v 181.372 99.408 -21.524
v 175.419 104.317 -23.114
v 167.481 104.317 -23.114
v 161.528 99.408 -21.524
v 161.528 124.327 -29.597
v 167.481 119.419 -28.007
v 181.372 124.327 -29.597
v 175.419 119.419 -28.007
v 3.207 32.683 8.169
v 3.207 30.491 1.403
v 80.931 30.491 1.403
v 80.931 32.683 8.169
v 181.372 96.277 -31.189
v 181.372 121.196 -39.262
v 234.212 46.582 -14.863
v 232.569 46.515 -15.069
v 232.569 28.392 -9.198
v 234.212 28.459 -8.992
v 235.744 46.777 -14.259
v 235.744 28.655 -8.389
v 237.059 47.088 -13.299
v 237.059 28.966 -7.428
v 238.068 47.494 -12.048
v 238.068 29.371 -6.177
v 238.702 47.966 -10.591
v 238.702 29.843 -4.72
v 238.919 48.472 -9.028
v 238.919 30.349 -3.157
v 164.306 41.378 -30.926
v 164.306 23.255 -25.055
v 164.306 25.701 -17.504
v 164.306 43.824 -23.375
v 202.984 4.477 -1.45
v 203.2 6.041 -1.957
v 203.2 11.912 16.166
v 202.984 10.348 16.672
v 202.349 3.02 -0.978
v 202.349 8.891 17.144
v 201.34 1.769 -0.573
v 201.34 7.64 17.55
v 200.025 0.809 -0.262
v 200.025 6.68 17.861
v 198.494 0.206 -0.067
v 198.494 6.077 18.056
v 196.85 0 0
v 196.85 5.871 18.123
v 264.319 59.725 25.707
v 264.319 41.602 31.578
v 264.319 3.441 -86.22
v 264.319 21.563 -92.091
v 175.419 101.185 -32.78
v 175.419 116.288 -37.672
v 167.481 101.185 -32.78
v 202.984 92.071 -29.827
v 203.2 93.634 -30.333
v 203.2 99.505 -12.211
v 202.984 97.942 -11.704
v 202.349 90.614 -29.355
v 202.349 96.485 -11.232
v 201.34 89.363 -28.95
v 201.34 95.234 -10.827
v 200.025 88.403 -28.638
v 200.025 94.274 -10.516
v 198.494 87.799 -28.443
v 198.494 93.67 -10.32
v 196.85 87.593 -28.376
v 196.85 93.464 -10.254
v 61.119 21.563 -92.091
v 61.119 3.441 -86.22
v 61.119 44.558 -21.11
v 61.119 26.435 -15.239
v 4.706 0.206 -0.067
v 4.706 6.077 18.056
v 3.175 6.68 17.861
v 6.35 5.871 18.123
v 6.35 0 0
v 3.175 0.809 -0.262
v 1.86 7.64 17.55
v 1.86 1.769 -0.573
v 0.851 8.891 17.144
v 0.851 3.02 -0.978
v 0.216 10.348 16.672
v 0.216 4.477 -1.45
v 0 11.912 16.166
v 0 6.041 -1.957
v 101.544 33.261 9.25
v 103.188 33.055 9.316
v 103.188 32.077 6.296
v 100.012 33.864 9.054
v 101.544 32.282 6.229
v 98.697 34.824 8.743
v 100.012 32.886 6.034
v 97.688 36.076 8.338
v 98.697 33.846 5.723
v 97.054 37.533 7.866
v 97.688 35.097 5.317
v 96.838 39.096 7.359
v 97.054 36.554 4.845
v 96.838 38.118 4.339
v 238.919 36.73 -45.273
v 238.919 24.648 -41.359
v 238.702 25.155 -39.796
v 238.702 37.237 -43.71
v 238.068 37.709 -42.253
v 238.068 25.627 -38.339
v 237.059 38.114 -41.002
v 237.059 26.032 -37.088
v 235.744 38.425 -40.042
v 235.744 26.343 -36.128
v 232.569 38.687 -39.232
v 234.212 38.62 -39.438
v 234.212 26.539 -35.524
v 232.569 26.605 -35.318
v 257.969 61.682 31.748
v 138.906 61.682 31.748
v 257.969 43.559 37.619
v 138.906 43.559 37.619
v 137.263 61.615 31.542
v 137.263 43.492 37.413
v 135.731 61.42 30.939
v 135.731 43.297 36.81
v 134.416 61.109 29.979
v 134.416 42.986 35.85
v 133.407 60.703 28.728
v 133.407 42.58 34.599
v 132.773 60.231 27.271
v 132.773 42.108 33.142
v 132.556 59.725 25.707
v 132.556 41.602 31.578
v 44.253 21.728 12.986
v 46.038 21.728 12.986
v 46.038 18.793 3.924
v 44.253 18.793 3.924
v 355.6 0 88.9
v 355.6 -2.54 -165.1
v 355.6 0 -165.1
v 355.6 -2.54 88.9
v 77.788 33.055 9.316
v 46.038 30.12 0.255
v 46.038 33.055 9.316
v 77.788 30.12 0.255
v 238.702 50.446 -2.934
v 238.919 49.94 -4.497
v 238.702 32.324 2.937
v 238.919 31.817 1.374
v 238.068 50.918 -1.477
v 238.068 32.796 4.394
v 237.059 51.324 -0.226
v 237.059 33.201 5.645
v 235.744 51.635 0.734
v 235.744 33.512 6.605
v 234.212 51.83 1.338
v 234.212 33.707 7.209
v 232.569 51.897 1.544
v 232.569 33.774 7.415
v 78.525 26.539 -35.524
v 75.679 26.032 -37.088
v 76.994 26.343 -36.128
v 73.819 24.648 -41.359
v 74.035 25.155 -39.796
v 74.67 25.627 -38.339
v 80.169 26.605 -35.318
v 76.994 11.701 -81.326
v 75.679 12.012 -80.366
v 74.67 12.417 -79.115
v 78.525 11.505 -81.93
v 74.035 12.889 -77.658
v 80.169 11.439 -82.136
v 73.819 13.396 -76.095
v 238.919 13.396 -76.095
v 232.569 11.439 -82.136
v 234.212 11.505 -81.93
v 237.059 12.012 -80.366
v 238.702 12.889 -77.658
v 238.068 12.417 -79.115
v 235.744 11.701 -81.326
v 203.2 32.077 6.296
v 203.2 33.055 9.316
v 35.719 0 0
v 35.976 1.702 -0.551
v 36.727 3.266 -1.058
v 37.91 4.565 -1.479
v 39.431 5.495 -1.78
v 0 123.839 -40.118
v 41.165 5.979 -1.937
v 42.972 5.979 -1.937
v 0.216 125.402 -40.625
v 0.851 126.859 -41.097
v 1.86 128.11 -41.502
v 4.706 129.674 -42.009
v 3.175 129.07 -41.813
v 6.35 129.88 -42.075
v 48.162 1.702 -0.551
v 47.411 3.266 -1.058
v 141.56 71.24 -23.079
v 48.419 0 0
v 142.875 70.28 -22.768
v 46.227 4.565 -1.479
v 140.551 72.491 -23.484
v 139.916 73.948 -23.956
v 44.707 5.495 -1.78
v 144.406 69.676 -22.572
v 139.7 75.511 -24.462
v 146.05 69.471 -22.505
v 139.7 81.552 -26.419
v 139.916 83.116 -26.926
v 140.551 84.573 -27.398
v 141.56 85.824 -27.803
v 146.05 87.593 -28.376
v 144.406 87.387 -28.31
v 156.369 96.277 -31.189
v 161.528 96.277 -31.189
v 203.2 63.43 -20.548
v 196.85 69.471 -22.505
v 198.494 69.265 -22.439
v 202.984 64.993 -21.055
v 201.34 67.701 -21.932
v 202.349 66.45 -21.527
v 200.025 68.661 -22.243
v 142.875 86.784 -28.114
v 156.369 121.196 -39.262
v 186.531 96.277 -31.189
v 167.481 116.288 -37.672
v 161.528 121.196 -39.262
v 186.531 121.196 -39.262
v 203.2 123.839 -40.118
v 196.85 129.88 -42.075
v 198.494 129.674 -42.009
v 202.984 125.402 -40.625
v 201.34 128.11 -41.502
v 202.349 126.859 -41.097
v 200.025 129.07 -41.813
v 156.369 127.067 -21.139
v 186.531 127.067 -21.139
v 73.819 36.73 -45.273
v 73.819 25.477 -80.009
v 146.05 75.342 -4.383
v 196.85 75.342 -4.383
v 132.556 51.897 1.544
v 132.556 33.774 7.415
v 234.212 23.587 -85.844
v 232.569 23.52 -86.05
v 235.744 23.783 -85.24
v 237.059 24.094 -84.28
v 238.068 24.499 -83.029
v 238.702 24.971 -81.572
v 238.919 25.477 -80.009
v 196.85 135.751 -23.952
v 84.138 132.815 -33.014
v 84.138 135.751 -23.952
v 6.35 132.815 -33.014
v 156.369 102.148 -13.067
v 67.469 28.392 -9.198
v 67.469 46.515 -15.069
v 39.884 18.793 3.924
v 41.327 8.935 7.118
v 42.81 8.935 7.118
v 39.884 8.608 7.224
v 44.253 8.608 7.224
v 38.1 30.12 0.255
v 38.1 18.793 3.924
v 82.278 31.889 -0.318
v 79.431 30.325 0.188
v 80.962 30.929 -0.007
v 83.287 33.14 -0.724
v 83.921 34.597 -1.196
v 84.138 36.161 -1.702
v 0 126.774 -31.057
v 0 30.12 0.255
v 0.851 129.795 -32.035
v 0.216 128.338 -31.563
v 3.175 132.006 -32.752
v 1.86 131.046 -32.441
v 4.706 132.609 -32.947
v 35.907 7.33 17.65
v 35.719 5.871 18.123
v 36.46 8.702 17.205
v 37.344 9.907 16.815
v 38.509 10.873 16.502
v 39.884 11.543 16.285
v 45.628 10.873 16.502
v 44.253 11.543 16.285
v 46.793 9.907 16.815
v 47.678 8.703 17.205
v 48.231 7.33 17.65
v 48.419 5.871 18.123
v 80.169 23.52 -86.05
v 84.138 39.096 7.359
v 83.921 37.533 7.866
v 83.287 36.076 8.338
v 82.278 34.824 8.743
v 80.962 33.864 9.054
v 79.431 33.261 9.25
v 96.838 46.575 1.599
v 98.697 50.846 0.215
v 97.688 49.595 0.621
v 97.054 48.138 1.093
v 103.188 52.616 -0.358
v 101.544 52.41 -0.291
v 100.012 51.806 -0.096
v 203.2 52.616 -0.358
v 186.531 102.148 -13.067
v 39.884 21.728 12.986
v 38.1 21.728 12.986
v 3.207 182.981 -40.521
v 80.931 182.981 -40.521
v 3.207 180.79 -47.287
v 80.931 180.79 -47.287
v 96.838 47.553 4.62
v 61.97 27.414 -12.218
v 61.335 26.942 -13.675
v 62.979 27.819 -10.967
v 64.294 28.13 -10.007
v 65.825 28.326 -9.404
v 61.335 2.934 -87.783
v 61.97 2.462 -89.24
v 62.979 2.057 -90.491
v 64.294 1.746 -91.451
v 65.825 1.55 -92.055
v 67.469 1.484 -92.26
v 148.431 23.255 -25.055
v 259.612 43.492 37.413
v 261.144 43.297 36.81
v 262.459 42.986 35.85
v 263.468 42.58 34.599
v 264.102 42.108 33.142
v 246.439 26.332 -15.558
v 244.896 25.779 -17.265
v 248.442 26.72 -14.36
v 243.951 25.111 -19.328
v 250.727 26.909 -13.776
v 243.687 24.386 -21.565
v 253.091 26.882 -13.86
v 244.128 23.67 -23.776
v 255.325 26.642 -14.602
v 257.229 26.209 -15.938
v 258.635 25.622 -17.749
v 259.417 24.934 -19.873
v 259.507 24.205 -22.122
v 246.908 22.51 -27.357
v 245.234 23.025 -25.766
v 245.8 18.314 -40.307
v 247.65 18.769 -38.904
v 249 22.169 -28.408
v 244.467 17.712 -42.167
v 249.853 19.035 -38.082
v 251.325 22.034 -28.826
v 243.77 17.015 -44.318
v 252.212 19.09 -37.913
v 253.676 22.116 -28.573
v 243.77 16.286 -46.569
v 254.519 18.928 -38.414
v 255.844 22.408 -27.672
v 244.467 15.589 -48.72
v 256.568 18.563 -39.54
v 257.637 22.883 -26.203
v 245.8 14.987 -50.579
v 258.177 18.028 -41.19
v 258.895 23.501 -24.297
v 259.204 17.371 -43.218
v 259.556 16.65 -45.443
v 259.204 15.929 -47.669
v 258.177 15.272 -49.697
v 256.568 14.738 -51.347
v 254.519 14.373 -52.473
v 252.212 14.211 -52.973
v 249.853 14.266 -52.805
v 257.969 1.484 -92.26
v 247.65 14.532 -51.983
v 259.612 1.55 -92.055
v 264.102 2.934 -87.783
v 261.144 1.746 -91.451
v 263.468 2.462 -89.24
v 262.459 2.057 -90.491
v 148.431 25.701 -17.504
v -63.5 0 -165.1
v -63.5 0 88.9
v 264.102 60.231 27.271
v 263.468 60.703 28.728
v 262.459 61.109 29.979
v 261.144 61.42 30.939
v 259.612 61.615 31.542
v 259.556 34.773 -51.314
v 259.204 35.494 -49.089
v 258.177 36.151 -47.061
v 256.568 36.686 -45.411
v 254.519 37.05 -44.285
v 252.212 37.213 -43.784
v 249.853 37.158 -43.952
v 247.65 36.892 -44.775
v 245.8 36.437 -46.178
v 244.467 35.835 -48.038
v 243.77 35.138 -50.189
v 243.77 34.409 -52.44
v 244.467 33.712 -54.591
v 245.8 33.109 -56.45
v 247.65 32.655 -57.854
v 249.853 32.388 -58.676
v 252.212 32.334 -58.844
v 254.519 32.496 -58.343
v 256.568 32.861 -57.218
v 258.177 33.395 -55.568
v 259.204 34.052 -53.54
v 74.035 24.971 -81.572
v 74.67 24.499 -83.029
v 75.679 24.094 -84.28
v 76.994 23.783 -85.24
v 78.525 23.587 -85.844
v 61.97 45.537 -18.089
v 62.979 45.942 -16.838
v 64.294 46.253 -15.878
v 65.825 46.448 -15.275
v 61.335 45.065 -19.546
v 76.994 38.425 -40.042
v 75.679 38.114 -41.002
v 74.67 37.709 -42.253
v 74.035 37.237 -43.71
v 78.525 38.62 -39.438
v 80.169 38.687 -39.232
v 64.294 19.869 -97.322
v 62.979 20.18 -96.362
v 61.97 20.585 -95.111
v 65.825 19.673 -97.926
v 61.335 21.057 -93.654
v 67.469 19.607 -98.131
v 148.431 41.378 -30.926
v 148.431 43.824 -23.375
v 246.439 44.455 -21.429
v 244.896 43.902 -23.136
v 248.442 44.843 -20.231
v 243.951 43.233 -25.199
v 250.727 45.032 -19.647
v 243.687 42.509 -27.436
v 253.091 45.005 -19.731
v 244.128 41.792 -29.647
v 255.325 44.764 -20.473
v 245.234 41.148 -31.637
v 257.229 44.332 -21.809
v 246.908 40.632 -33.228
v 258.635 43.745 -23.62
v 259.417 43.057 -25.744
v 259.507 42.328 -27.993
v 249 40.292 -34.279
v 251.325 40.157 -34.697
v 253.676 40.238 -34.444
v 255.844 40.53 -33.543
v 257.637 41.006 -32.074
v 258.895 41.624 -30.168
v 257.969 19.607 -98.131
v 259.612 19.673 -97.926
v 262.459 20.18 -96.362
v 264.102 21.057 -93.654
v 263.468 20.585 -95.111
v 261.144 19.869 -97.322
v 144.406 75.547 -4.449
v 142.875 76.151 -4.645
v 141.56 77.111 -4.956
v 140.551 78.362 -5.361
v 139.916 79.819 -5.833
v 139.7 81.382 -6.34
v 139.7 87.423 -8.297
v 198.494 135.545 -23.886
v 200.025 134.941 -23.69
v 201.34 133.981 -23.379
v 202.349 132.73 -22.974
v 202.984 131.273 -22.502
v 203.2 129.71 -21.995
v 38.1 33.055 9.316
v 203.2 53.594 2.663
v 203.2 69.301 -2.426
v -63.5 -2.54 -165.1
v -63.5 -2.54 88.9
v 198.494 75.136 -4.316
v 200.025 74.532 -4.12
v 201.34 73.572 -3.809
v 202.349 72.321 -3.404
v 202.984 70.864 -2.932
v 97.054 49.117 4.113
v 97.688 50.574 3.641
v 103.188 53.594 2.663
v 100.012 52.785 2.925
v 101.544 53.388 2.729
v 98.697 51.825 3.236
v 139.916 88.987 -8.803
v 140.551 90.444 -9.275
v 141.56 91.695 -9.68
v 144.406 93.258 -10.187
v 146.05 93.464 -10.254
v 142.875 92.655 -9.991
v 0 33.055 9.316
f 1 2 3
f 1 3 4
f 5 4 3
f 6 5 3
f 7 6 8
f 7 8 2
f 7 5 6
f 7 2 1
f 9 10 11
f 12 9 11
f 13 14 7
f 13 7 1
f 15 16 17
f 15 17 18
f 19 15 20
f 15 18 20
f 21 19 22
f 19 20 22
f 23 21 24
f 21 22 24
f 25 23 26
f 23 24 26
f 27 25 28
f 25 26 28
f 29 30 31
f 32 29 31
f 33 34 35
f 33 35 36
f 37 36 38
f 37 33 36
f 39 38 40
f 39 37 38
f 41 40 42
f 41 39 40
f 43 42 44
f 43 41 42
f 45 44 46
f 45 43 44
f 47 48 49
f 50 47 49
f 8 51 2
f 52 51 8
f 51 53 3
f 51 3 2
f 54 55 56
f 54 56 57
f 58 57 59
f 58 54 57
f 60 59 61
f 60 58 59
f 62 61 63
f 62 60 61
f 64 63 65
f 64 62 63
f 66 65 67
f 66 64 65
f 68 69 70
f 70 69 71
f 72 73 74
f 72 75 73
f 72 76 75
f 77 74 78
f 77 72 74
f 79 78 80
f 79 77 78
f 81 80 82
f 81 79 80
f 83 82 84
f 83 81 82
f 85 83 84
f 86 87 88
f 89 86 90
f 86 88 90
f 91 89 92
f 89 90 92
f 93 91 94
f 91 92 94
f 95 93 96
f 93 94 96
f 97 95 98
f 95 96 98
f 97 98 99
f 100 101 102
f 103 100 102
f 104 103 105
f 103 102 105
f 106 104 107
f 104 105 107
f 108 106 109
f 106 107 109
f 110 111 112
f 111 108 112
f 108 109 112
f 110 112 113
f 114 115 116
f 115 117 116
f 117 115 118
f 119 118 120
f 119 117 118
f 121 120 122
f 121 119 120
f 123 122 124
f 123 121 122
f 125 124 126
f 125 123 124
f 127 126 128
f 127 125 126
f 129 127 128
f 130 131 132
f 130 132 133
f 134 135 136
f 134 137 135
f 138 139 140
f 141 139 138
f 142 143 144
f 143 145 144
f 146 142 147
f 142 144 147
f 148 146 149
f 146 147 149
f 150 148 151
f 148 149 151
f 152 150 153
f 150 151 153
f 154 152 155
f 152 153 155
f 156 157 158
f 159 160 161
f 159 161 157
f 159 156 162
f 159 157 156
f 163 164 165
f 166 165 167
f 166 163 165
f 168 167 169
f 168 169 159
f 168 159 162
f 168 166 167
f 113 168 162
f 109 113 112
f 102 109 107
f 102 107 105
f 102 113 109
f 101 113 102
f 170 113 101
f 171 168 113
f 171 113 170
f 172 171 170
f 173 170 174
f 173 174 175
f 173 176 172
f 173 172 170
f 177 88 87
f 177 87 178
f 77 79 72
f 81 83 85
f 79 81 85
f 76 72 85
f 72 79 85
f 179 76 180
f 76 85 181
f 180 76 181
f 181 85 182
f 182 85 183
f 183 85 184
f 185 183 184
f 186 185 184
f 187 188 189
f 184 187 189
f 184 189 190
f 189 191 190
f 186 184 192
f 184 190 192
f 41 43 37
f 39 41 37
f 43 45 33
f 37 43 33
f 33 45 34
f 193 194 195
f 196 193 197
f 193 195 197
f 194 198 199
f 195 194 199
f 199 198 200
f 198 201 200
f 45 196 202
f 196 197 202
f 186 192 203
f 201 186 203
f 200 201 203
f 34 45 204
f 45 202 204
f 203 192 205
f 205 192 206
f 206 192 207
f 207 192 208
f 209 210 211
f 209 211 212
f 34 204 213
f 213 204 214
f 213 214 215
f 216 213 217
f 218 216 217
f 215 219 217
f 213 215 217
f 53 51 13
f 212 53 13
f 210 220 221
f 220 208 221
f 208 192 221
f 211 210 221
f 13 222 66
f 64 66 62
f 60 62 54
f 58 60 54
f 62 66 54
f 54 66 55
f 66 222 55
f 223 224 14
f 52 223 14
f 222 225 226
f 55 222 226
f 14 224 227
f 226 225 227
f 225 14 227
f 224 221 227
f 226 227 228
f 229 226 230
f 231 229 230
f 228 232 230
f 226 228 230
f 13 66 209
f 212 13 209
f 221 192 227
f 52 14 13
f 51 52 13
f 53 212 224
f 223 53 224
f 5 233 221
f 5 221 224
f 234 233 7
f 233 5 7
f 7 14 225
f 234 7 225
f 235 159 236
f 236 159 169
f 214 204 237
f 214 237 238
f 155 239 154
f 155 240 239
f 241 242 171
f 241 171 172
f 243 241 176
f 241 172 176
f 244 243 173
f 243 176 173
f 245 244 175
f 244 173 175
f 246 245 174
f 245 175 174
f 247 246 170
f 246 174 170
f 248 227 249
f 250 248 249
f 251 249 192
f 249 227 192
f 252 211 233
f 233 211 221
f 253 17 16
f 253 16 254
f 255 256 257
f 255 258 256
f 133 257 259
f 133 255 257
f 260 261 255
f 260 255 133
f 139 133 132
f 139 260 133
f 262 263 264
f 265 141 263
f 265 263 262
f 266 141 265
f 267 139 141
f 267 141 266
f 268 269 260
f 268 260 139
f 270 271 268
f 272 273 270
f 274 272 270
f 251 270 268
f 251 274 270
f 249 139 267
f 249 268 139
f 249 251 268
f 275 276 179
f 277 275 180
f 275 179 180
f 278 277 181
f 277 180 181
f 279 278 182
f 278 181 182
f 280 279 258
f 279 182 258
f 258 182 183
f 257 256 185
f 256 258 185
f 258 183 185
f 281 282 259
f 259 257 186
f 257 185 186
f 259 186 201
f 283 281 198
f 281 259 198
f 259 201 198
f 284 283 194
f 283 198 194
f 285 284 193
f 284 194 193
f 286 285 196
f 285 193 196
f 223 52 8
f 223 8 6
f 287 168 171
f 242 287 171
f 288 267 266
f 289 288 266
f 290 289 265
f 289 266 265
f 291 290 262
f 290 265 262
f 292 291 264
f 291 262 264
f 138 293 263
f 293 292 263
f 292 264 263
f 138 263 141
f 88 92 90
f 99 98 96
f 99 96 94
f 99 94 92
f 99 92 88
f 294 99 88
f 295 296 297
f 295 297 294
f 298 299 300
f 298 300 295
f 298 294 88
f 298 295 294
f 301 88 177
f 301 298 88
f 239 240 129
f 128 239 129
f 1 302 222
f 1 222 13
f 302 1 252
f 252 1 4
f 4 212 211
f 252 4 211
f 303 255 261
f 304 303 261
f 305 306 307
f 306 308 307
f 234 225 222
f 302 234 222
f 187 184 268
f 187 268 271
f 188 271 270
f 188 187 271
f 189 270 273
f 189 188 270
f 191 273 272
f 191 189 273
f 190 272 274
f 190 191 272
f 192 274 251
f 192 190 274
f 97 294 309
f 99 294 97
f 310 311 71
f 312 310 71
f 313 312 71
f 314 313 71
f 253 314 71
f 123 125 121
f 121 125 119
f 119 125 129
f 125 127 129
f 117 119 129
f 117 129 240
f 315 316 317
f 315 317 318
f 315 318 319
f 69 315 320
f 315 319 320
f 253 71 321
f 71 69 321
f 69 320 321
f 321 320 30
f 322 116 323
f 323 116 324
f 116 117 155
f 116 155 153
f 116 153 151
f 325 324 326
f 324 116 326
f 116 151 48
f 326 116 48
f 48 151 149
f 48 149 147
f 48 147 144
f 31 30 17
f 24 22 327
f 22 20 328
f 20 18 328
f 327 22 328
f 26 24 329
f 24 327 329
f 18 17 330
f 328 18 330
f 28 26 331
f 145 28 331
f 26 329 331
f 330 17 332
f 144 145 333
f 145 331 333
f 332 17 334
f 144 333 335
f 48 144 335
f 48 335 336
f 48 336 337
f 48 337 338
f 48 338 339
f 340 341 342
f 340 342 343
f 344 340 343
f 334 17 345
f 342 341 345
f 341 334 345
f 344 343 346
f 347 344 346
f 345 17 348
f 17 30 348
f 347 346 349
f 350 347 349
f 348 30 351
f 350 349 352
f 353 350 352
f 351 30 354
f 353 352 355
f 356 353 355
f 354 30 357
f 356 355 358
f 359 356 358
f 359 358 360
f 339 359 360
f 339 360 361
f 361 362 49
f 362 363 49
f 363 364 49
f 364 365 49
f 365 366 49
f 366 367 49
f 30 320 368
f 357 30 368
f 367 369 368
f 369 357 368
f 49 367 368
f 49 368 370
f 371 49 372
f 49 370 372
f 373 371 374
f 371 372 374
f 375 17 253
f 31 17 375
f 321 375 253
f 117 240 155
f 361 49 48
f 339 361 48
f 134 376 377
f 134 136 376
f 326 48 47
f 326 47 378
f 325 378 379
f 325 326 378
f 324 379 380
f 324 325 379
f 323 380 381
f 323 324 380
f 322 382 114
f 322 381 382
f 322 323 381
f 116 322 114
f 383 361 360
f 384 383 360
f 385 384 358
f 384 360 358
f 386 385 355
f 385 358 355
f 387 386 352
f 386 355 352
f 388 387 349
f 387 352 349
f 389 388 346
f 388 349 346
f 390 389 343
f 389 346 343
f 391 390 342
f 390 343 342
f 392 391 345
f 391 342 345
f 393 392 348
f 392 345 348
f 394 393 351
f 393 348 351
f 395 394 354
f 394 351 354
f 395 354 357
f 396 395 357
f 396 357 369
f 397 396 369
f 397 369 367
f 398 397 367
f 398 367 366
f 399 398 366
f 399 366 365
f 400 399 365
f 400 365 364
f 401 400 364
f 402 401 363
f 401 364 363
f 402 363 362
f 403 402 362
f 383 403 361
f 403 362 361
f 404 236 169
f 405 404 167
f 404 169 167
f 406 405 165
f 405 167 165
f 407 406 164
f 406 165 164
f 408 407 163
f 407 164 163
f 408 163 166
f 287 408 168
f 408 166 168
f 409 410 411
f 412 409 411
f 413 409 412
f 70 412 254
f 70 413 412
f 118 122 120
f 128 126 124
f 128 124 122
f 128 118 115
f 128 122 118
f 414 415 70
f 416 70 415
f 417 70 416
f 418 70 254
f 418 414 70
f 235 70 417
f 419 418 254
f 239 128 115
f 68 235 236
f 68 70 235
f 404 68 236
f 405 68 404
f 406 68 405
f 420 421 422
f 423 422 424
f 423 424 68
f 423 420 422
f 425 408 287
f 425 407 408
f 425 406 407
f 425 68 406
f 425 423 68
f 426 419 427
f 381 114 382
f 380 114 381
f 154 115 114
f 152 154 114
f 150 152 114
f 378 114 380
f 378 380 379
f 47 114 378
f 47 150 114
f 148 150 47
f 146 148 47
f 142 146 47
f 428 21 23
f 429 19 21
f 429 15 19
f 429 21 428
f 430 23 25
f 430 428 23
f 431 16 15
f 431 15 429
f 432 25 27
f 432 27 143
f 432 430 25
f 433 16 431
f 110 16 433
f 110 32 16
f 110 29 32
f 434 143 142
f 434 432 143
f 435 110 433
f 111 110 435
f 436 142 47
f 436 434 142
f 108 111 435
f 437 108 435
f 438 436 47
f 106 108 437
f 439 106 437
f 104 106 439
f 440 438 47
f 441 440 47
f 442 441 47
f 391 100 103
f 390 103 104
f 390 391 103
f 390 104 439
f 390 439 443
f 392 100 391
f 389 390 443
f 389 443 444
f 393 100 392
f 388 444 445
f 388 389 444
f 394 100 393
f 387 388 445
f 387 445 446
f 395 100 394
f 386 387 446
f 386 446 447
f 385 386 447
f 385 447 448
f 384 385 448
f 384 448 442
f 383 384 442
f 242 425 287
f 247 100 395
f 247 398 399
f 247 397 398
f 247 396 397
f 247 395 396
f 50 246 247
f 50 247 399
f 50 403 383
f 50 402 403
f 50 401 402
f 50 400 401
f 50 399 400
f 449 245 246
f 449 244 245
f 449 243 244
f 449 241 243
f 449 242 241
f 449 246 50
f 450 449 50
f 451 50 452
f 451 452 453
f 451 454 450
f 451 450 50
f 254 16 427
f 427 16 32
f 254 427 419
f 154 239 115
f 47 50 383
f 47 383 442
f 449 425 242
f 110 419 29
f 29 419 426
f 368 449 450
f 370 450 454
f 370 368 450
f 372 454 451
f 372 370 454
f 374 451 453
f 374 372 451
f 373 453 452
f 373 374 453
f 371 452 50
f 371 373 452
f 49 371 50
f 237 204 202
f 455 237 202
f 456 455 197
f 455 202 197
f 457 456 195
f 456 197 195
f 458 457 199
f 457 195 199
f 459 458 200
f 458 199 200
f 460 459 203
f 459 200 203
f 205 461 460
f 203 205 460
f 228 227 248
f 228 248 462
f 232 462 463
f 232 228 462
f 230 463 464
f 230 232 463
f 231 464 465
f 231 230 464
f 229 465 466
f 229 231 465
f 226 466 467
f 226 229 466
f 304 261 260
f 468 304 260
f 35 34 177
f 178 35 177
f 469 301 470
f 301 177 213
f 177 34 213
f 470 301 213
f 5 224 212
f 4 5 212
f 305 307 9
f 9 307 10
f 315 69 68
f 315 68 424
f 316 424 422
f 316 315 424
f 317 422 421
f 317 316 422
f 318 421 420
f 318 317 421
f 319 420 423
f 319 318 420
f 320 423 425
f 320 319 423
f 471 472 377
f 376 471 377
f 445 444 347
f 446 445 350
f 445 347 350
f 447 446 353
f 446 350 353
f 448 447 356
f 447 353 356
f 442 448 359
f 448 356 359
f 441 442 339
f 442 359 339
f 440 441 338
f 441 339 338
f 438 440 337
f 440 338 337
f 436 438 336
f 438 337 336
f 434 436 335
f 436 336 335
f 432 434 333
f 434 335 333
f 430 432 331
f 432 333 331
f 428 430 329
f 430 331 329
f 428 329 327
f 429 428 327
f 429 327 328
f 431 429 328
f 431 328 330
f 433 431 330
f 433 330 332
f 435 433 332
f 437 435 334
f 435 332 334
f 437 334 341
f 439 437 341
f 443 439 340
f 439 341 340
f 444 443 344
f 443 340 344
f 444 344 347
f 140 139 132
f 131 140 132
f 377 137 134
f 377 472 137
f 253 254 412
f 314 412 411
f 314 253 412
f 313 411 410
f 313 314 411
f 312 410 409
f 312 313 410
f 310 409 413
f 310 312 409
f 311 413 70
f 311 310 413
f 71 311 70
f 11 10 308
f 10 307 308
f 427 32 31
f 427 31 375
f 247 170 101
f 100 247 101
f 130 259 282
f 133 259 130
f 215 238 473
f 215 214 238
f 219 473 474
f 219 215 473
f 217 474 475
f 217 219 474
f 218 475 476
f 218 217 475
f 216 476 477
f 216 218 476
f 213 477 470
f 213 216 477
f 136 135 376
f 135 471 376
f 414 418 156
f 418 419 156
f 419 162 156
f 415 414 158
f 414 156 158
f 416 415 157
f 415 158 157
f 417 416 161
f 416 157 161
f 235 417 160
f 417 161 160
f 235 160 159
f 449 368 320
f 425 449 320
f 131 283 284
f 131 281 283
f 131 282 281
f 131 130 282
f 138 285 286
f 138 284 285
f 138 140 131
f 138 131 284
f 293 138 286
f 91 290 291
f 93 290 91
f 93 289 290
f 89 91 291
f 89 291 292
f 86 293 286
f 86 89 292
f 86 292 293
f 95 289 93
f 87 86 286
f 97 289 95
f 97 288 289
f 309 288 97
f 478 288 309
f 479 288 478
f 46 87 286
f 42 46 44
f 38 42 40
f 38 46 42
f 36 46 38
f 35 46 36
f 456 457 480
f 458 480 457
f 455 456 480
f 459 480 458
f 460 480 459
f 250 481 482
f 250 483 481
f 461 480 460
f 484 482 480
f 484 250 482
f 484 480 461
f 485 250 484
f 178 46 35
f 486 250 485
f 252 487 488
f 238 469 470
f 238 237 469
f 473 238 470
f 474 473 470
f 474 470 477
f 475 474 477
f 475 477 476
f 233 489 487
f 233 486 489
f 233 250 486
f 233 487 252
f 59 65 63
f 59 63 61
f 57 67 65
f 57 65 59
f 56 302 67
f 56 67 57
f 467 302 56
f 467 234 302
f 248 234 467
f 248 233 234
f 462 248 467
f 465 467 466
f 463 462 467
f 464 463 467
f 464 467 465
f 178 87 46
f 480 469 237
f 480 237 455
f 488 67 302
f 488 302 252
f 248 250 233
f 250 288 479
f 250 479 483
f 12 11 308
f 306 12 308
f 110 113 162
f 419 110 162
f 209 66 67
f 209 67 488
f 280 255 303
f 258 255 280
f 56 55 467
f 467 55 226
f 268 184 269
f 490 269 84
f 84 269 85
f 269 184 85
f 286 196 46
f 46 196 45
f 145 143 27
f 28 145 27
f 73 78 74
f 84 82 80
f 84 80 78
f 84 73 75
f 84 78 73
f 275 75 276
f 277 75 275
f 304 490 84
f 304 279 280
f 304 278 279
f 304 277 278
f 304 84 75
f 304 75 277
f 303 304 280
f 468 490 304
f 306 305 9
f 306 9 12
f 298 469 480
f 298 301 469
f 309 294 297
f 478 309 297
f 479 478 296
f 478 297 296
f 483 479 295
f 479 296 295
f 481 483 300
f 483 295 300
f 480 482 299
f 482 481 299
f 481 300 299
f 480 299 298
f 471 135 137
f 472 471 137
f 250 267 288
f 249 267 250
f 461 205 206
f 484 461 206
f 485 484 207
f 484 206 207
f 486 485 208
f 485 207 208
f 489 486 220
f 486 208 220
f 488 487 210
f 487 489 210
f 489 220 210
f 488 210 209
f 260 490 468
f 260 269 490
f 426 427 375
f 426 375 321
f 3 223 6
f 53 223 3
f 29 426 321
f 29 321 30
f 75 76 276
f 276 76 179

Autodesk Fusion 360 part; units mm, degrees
sketch "Face Plate Sketch" plane through (0, 0, 0) normal (0, 0, 1) x (1, 0, 0)
  line L0 (6.35, 0) -> (196.85, 0)
  line L1 (196.85, 136.525) -> (6.35, 136.525)
  line L2 (0, 130.175) -> (0, 6.35)
  line L3 (0, 28.575) -> (77.7875, 28.575)
  line L4 (84.1375, 34.925) -> (84.1375, 136.525)
  line L5 (196.85, 92.075) -> (146.05, 92.075)
  line L6 (139.7, 92.075) -> (139.7, 136.525)
  line L7 (139.7, 85.725) -> (139.7, 79.375)
  line L8 (146.05, 73.025) -> (196.85, 73.025)
  line L9 (203.2, 50.165) -> (103.1875, 50.165)
  line L10 (96.8375, 43.815) -> (96.8375, 34.925)
  line L11 (103.1875, 28.575) -> (203.2, 28.575)
  line L12 (203.2, 6.35) -> (203.2, 66.675)
  line L13 (203.2, 98.425) -> (203.2, 130.175)
  arc A0 (146.05, 92.075) -> (139.7, 85.725) centre (146.05, 85.725) ccw
  arc A1 (196.85, 92.075) -> (203.2, 98.425) centre (196.85, 98.425) ccw
  arc A2 (203.2, 130.175) -> (196.85, 136.525) centre (196.85, 130.175) ccw
  arc A3 (139.7, 79.375) -> (146.05, 73.025) centre (146.05, 79.375) ccw
  arc A4 (203.2, 66.675) -> (196.85, 73.025) centre (196.85, 66.675) ccw
  arc A5 (103.1875, 50.165) -> (96.8375, 43.815) centre (103.1875, 43.815) ccw
  arc A6 (96.8375, 34.925) -> (103.1875, 28.575) centre (103.1875, 34.925) ccw
  arc A7 (196.85, 0) -> (203.2, 6.35) centre (196.85, 6.35) ccw
  arc A8 (0, 6.35) -> (6.35, 0) centre (6.35, 6.35) ccw
  arc A9 (6.35, 136.525) -> (0, 130.175) centre (6.35, 130.175) ccw
  arc A10 (77.7875, 28.575) -> (84.1375, 34.925) centre (77.7875, 34.925) ccw
  line L14 (139.7, 114.3) -> (171.45, 114.3) construction
  line L15 (171.45, 92.075) -> (171.45, 127) construction
  line L16 (171.45, 114.3) -> (203.2, 114.3) construction
  line L17 (175.4188, 122.2375) -> (167.4813, 122.2375)
  line L18 (167.4813, 122.2375) -> (167.4813, 106.3625)
  line L19 (167.4813, 106.3625) -> (175.4188, 106.3625)
  line L20 (175.4188, 106.3625) -> (175.4188, 122.2375)
  line L21 (175.4188, 122.2375) -> (167.4813, 106.3625) construction
  line L22 (167.4813, 122.2375) -> (175.4188, 106.3625) construction
  line L23 (181.3719, 103.1875) -> (161.5281, 103.1875)
  line L24 (161.5281, 103.1875) -> (161.5281, 125.4125)
  line L25 (161.5281, 125.4125) -> (181.3719, 125.4125)
  line L26 (181.3719, 125.4125) -> (181.3719, 103.1875)
  line L27 (181.3719, 103.1875) -> (161.5281, 125.4125) construction
  line L28 (161.5281, 103.1875) -> (181.3719, 125.4125) construction
  line L29 (186.5313, 101.2031) -> (156.3688, 101.2031)
  line L30 (156.3688, 101.2031) -> (156.3688, 127.3969)
  line L31 (156.3688, 127.3969) -> (186.5313, 127.3969)
  line L32 (186.5313, 127.3969) -> (186.5313, 101.2031)
  line L33 (186.5313, 101.2031) -> (156.3688, 127.3969) construction
  line L34 (156.3688, 101.2031) -> (186.5313, 127.3969) construction
  line L35 (161.5281, 125.4125) -> (161.5281, 127.3969)
  line L36 (181.3719, 125.4125) -> (181.3719, 127.3969)
  line L37 (181.3719, 103.1875) -> (181.3719, 101.2031)
  line L38 (161.5281, 103.1875) -> (161.5281, 101.2031)
  line L39 (42.0687, 31.8116) -> (42.0687, 28.575) construction
  line L40 (38.1, 28.575) -> (46.0375, 28.575)
  line L41 (46.0375, 28.575) -> (46.0375, 16.6687)
  line L42 (46.0375, 16.6687) -> (38.1, 16.6687)
  line L43 (38.1, 16.6687) -> (38.1, 28.575)
  line L44 (44.2531, 16.6687) -> (39.8843, 16.6687)
  line L45 (39.8843, 16.6687) -> (39.8843, 5.5562)
  line L46 (39.8843, 5.5562) -> (44.2531, 5.5562)
  line L47 (44.2531, 5.5562) -> (44.2531, 16.6687)
  line L48 (40.4812, 5.5562) -> (43.6562, 5.5562)
  line L49 (43.6562, 5.5562) -> (43.6563, 0)
  line L50 (43.6563, 0) -> (40.4813, 0)
  line L51 (40.4813, 0) -> (40.4812, 5.5562)
  line L52 (40.4813, 0) -> (43.6563, 0)
  circle A11 centre (42.0688, 0) radius 6.35
  point P0 (203.2, 0)
  point P1 (84.1375, 28.575)
  point P2 (139.7, 73.025)
  point P3 (96.8375, 50.165)
  point P4 (96.8375, 28.575)
  point P5 (171.45, 114.3)
  point P6 (171.45, 114.3)
  point P7 (171.45, 114.3)
  point P8 (171.45, 114.3)
  point P9 (42.0687, 28.575)
  point P10 (42.0687, 16.6687)
  point P11 (42.0687, 16.6687)
  point P12 (42.0687, 5.5562)
  point P13 (42.0687, 5.5562)
  point P14 (42.0688, 0)
  dimension "d3" = 84.1375
  dimension "d5" = 44.45
  dimension "d6" = 19.05
  dimension "d8" = 12.7
  dimension "d9" = 21.59
  dimension "d12" = 28.575
  dimension "d13" = 25.4
  dimension "d28" = 6.35
  dimension "d29" = 6.35
  dimension "d30" = 6.35
  dimension "d31" = 6.35
  dimension "d32" = 6.35
  dimension "d33" = 6.35
  dimension "d76" = 106.3625
  dimension "d77" = 203.2
  dimension "d163" = 6.35
  dimension "d185" = 63.5
  dimension "d193" = 7.9375
  dimension "d194" = 15.875
  dimension "d195" = 19.8438
  dimension "d196" = 22.225
  dimension "d197" = 26.1938
  dimension "d198" = 30.1625
  dimension "d202" = 7.9375
  dimension "d203" = 11.9062
  dimension "d204" = 11.1125
  dimension "d205" = 4.3688
  dimension "d206" = 3.175
  dimension "d220" = 12.7
  dimension "d224" = 136.525
extrude "Extrude1" add sketch "Face Plate Sketch" along normal blind 19.05 contours L0 L2 L3 A8 L42 L43 L45 A11 | L0 L1 L3 L4 L5 L7 L8 L9 L10 L11 L12 L13 A0 A1 A2 A3 A4 A5 A6 A7 A10 L41 L42 L47 A11 makes body 1 at (108.7286, 91.0847, 0) makes body 2 at (12.7, 17.1979, 0) in component "Face Plate"
extrude "Extrude6" add sketch "Face Plate Sketch" along normal blind 9.525 contours L42 L44 L45 L47 A11 | L3 L40 L41 L42 L43 L44 bodies 1 2 in component "Face Plate"
extrude "Extrude2" add sketch "Face Plate Sketch" along normal blind 15.875 contours L9 L10 L11 L12 A5 A6 bodies 1 in component "Face Plate"
extrude "Extrude4" add sketch "Face Plate Sketch" along normal blind 9.525 contours L1 L2 L3 L4 A9 A10 L40 bodies 1 in component "Face Plate"
extrude "Extrude5" add sketch "Face Plate Sketch" along normal blind 10.16 contours L23 L29 L37 L38 | L23 L24 L25 L26 | L25 L31 L35 L36 bodies 1 in component "Face Plate"
sketch "iPhone" plane through (0, 0, 0) normal (0, 0, 1) x (1, 0, 0)
  line L0 (0, 0) -> (77.724, 0)
  line L1 (77.724, 0) -> (77.724, 157.988)
  line L2 (77.724, 157.988) -> (0, 157.988)
  line L3 (0, 157.988) -> (0, 0)
  dimension "d49" = 157.988
  dimension "d50" = 77.724
extrude "Extrude1'" add sketch "iPhone" along normal blind 7.112 separate body makes body 3 in component "iPhone"
sketch "Base Plate Sketch" plane through (0, 0, 0) normal (0, 1, 0) x (1, 0, 0)
  line L0 (0, 0) -> (119.0625, 0)
  line L1 (125.4125, 6.35) -> (125.4125, 130.175)
  line L2 (119.0625, 136.525) -> (-71.4375, 136.525)
  line L3 (-6.35, 31.75) -> (93.6625, 31.75)
  line L4 (100.0125, 38.1) -> (100.0125, 42.8625)
  line L5 (93.6625, 49.2125) -> (-71.4375, 49.2125)
  arc A0 (93.6625, 31.75) -> (100.0125, 38.1) centre (93.6625, 38.1) ccw
  arc A1 (100.0125, 42.8625) -> (93.6625, 49.2125) centre (93.6625, 42.8625) ccw
  line L6 (-77.7875, 130.175) -> (-77.7875, 55.5625)
  line L7 (-6.35, 31.75) -> (-6.35, 6.35)
  circle A2 centre (112.7125, 87.3125) radius 7.9375
  arc A3 (-6.35, 6.35) -> (0, 0) centre (0, 6.35) ccw
  arc A4 (119.0625, 0) -> (125.4125, 6.35) centre (119.0625, 6.35) ccw
  arc A5 (125.4125, 130.175) -> (119.0625, 136.525) centre (119.0625, 130.175) ccw
  arc A6 (-71.4375, 136.525) -> (-77.7875, 130.175) centre (-71.4375, 130.175) ccw
  arc A7 (-77.7875, 55.5625) -> (-71.4375, 49.2125) centre (-71.4375, 55.5625) ccw
  line L8 (-58.7375, 123.825) -> (93.6625, 123.825)
  line L9 (100.0125, 117.475) -> (100.0125, 80.9625)
  line L10 (93.6625, 74.6125) -> (-58.7375, 74.6125)
  line L11 (-65.0875, 80.9625) -> (-65.0875, 117.475)
  arc A8 (-58.7375, 123.825) -> (-65.0875, 117.475) centre (-58.7375, 117.475) ccw
  arc A9 (-65.0875, 80.9625) -> (-58.7375, 74.6125) centre (-58.7375, 80.9625) ccw
  arc A10 (93.6625, 74.6125) -> (100.0125, 80.9625) centre (93.6625, 80.9625) ccw
  arc A11 (100.0125, 117.475) -> (93.6625, 123.825) centre (93.6625, 117.475) ccw
  line L12 (112.7125, 61.9125) -> (112.7125, 87.3125) construction
  line L13 (9.525, 65.8813) -> (25.4, 65.8813)
  line L14 (25.4, 65.8813) -> (25.4, 57.9438)
  line L15 (25.4, 57.9438) -> (9.525, 57.9438)
  line L16 (9.525, 57.9438) -> (9.525, 65.8813)
  line L17 (17.4625, 65.8813) -> (17.4625, 74.6125) construction
  line L18 (17.4625, 57.9438) -> (17.4625, 49.2125) construction
  arc A12 (112.4188, 69.8446) -> (113.0062, 53.9804) centre (112.7125, 61.9125) ccw
  arc A13 (113.0062, 53.9804) -> (112.4188, 69.8446) centre (112.7125, 61.9125) ccw
  line L19 (85.4474, 49.2125) -> (85.4474, 74.6125) construction
  line L20 (85.4474, 61.9125) -> (125.4125, 61.9125) construction
  point P0 (125.4125, 0)
  point P1 (125.4125, 136.525)
  point P2 (-77.7875, 136.525)
  point P3 (100.0125, 31.75)
  point P4 (17.4625, 74.6125)
  point P5 (17.4625, 65.8813)
  dimension "d80" = 17.4625
  dimension "d82" = 31.75
  dimension "d83" = 6.35
  dimension "d84" = 6.35
  dimension "d114" = 136.525
  dimension "d115" = 203.2
  dimension "d116" = 25.4
  dimension "d118" = 106.3625
  dimension "d143" = 15.875
  dimension "d144" = 12.7
  dimension "d146" = 6.35
  dimension "d147" = 6.35
  dimension "d148" = 6.35
  dimension "d149" = 6.35
  dimension "d150" = 6.35
  dimension "d151" = 12.7
  dimension "d152" = 25.4
  dimension "d153" = 12.7
  dimension "d154" = 25.4
  dimension "d156" = 6.35
  dimension "d157" = 6.35
  dimension "d158" = 6.35
  dimension "d159" = 6.35
  dimension "d201" = 15.875
  dimension "d221" = 15.875
  dimension "d222" = 7.9375
  dimension "d223" = 25.4
extrude "Extrude1''" add sketch "Base Plate Sketch" along normal blind 19.05 separate body makes body 4 in component "Base Plate"
extrude "Extrude2'" add sketch "Base Plate Sketch" along normal blind 6.35 contours L8 L9 L10 L11 A8 A9 A10 A11 bodies 4 in component "Base Plate"
box "BoxPrimitive1" add length 254 width 419.1 height 2.54 placed x (0, 0, 1) y (1, 0, 0) z (0, 1, 0) at (-63.5, 0, -101.6) separate body makes body 5 in component "Valet"
copy_body "CutPasteBodies1" bodies 5 removing the originals makes body 6 in component "Ground"
sketch "Base Plate Projection" plane through (105.9656, 43.559, 37.6193) normal (0, 0.9513, -0.3082) x (1, 0, 0)
  circle A0 centre (112.7125, 61.9125) radius 7.9375
  line L0 (25.4, 57.9438) -> (9.525, 57.9438)
  line L1 (9.525, 57.9438) -> (9.525, 65.8813)
  line L2 (9.525, 65.8813) -> (25.4, 65.8813)
  line L3 (25.4, 65.8813) -> (25.4, 57.9438)
  arc A1 (93.6625, 74.6125) -> (100.0125, 80.9625) centre (93.6625, 80.9625) ccw
  line L4 (93.6625, 74.6125) -> (-58.7375, 74.6125)
  arc A2 (-65.0875, 80.9625) -> (-58.7375, 74.6125) centre (-58.7375, 80.9625) ccw
  line L5 (-65.0875, 80.9625) -> (-65.0875, 117.475)
  arc A3 (-58.7375, 123.825) -> (-65.0875, 117.475) centre (-58.7375, 117.475) ccw
  line L6 (-58.7375, 123.825) -> (93.6625, 123.825)
  arc A4 (100.0125, 117.475) -> (93.6625, 123.825) centre (93.6625, 117.475) ccw
  line L7 (100.0125, 117.475) -> (100.0125, 80.9625)
  circle A5 centre (112.7125, 87.3125) radius 7.9375
  line L8 (-6.35, 31.75) -> (-6.35, 6.35)
  arc A6 (-6.35, 6.35) -> (0, 0) centre (0, 6.35) ccw
  line L9 (0, 0) -> (119.0625, 0)
  arc A7 (119.0625, 0) -> (125.4125, 6.35) centre (119.0625, 6.35) ccw
  line L10 (125.4125, 6.35) -> (125.4125, 130.175)
  arc A8 (125.4125, 130.175) -> (119.0625, 136.525) centre (119.0625, 130.175) ccw
  line L11 (119.0625, 136.525) -> (-71.4375, 136.525)
  arc A9 (-71.4375, 136.525) -> (-77.7875, 130.175) centre (-71.4375, 130.175) ccw
  line L12 (-77.7875, 130.175) -> (-77.7875, 55.5625)
  arc A10 (-77.7875, 55.5625) -> (-71.4375, 49.2125) centre (-71.4375, 55.5625) ccw
  line L13 (-71.4375, 49.2125) -> (93.6625, 49.2125)
  arc A11 (100.0125, 42.8625) -> (93.6625, 49.2125) centre (93.6625, 42.8625) ccw
  line L14 (100.0125, 42.8625) -> (100.0125, 38.1)
  arc A12 (93.6625, 31.75) -> (100.0125, 38.1) centre (93.6625, 38.1) ccw
  line L15 (93.6625, 31.75) -> (-6.35, 31.75)
sketch "Face Plate Projection" plane through (0, 0, 0) normal (0, 0.3082, 0.9513) x (1, 0, 0)
  line L0 (156.3688, 127.3969) -> (186.5313, 127.3969)
  line L1 (186.5313, 127.3969) -> (186.5313, 101.2031)
  line L2 (186.5313, 101.2031) -> (156.3688, 101.2031)
  line L3 (156.3688, 101.2031) -> (156.3688, 127.3969)
  arc A0 (196.85, 0) -> (203.2, 6.35) centre (196.85, 6.35) ccw
  line L4 (203.2, 6.35) -> (203.2, 28.575)
  line L5 (203.2, 28.575) -> (103.1875, 28.575)
  arc A1 (96.8375, 34.925) -> (103.1875, 28.575) centre (103.1875, 34.925) ccw
  line L6 (96.8375, 34.925) -> (96.8375, 43.815)
  arc A2 (103.1875, 50.165) -> (96.8375, 43.815) centre (103.1875, 43.815) ccw
  line L7 (103.1875, 50.165) -> (203.2, 50.165)
  line L8 (203.2, 50.165) -> (203.2, 66.675)
  arc A3 (203.2, 66.675) -> (196.85, 73.025) centre (196.85, 66.675) ccw
  line L9 (196.85, 73.025) -> (146.05, 73.025)
  arc A4 (139.7, 79.375) -> (146.05, 73.025) centre (146.05, 79.375) ccw
  line L10 (139.7, 79.375) -> (139.7, 85.725)
  arc A5 (146.05, 92.075) -> (139.7, 85.725) centre (146.05, 85.725) ccw
  line L11 (146.05, 92.075) -> (196.85, 92.075)
  arc A6 (196.85, 92.075) -> (203.2, 98.425) centre (196.85, 98.425) ccw
  line L12 (203.2, 98.425) -> (203.2, 130.175)
  arc A7 (203.2, 130.175) -> (196.85, 136.525) centre (196.85, 130.175) ccw
  line L13 (196.85, 136.525) -> (84.1375, 136.525)
  line L14 (84.1375, 136.525) -> (84.1375, 34.925)
  arc A8 (77.7875, 28.575) -> (84.1375, 34.925) centre (77.7875, 34.925) ccw
  line L15 (77.7875, 28.575) -> (46.0375, 28.575)
  line L16 (46.0375, 28.575) -> (46.0375, 16.6687)
  line L17 (46.0375, 16.6687) -> (44.2531, 16.6687)
  line L18 (44.2531, 16.6687) -> (44.2531, 5.9625)
  arc A9 (48.4188, 0) -> (44.2531, 5.9625) centre (42.0688, 0) ccw
  line L19 (48.4188, 0) -> (196.85, 0)
  arc A10 (96.8375, 34.925) -> (103.1875, 28.575) centre (103.1875, 34.925) ccw
  line L20 (103.1875, 28.575) -> (203.2, 28.575)
  line L21 (203.2, 28.575) -> (203.2, 50.165)
  line L22 (203.2, 50.165) -> (103.1875, 50.165)
  arc A11 (103.1875, 50.165) -> (96.8375, 43.815) centre (103.1875, 43.815) ccw
  line L23 (96.8375, 43.815) -> (96.8375, 34.925)
  line L24 (39.8843, 16.6687) -> (39.8843, 5.9625)
  arc A12 (44.2531, 5.9625) -> (39.8843, 5.9625) centre (42.0688, 0) ccw
  line L25 (44.2531, 5.9625) -> (44.2531, 16.6687)
  line L26 (44.2531, 16.6687) -> (46.0375, 16.6687)
  line L27 (46.0375, 16.6687) -> (46.0375, 28.575)
  line L28 (46.0375, 28.575) -> (77.7875, 28.575)
  arc A13 (77.7875, 28.575) -> (84.1375, 34.925) centre (77.7875, 34.925) ccw
  line L29 (84.1375, 34.925) -> (84.1375, 136.525)
  line L30 (84.1375, 136.525) -> (6.35, 136.525)
  arc A14 (6.35, 136.525) -> (0, 130.175) centre (6.35, 130.175) ccw
  line L31 (0, 130.175) -> (0, 28.575)
  line L32 (0, 28.575) -> (38.1, 28.575)
  line L33 (38.1, 28.575) -> (38.1, 16.6687)
  line L34 (38.1, 16.6687) -> (39.8843, 16.6687)
  line L35 (38.1, 16.6687) -> (38.1, 28.575)
  line L36 (38.1, 28.575) -> (0, 28.575)
  line L37 (0, 28.575) -> (0, 6.35)
  arc A15 (0, 6.35) -> (6.35, 0) centre (6.35, 6.35) ccw
  line L38 (6.35, 0) -> (35.7188, 0)
  arc A16 (39.8843, 5.9625) -> (35.7188, 0) centre (42.0688, 0) ccw
  line L39 (39.8843, 5.9625) -> (39.8843, 16.6687)
  line L40 (39.8843, 16.6687) -> (38.1, 16.6687)
  line L41 (175.4188, 122.2375) -> (175.4188, 106.3625)
  line L42 (175.4188, 106.3625) -> (167.4813, 106.3625)
  line L43 (167.4813, 106.3625) -> (167.4813, 122.2375)
  line L44 (167.4813, 122.2375) -> (175.4188, 122.2375)
  line L45 (161.5281, 127.3969) -> (161.5281, 101.2031)
  line L46 (161.5281, 101.2031) -> (181.3719, 101.2031)
  line L47 (181.3719, 101.2031) -> (181.3719, 127.3969)
  line L48 (181.3719, 127.3969) -> (161.5281, 127.3969)
component "Valet" placed x (1, 0, 0) y (0, 0.951326, -0.308187) z (0, 0.308187, 0.951326) at (0, 0, 0)
component "Ground" placed x (1, 0, 0) y (0, 1, 0) z (0, 0, 1) at (0, -2.54, -63.5)
component "Face Plate" placed x (1, 0, 0) y (0, 1, 0) z (0, 0, 1) at (0, 0, 0) in component "Valet"
component "Base Plate" placed x (1, 0, 0) y (0, 1, 0) z (0, 0, 1) at (138.9063, 29.845, 49.2125) in component "Valet"
component "iPhone" placed x (1, 0, 0) y (0, 1, 0) z (0, 0, 1) at (3.2067, 28.575, 10.7315) in component "Valet"
equation "d3 = 3 5/16\""
equation "d6 = 3/4\""
equation "d12 = 1 1/8\""
equation "d13 = 1\""
equation "d25 = 3/4\""
equation "Fillets = 1/4\""
equation "d28 = Fillets"
equation "d29 = Fillets"
equation "d30 = Fillets"
equation "d31 = Fillets"
equation "d32 = Fillets"
equation "d33 = Fillets"
equation "d37 = 3/4\" - 1/8\""
equation "d53 = 0\""
equation "d54 = 0\""
equation "d55 = 0\""
equation "d57 = 0\""
equation "d58 = 0\""
equation "d59 = 0\""
equation "d62 = 29/32\""
equation "d63 = 0\""
equation "d64 = 0\""
equation "d65 = 0\""
equation "d66 = 0\""
equation "d67 = 0\""
equation "d69 = 0\""
equation "d70 = 0\""
equation "d71 = 0\""
equation "GrooveLen = 4 3/16\""
equation "d76 = GrooveLen"
equation "d77 = 8\""
equation "d80 = 3/4\" - 1/16\""
equation "d82 = 1 1/4\""
equation "d83 = Fillets"
equation "d84 = Fillets"
equation "d85 = ( 3 / 4 ) * 1 in"
equation "d87 = 0\""
equation "d88 = 0\""
equation "d89 = 0\""
equation "d91 = 0\""
equation "d92 = 0\""
equation "d93 = 0\""
equation "d96 = 0\""
equation "d97 = 0\""
equation "d98 = -3/4\" + 1/8\""
equation "d99 = 0\""
equation "d100 = 0\""
equation "d101 = 0\""
equation "d103 = 0\""
equation "d104 = 0\""
equation "d105 = 0\""
equation "d107 = -1 19/64\""
equation "d108 = 2 1/2\""
equation "d109 = 10\""
equation "d110 = 16 1/2\""
equation "d112 = 0\""
equation "d113 = 0\""
equation "d114 = 5.5 in - 0.125 in"
equation "d118 = GrooveLen"
equation "d119 = 0\""
equation "d120 = 0\""
equation "d121 = 0\""
equation "d123 = 0\""
equation "d124 = 0\""
equation "d125 = 0\""
equation "d128 = 0\""
equation "d129 = 0\""
equation "d130 = 0\""
equation "d132 = 0\""
equation "d133 = 0\""
equation "d134 = 0\""
equation "d144 = 1/2\""
equation "d146 = Fillets"
equation "d147 = Fillets"
equation "d148 = Fillets"
equation "d149 = Fillets"
equation "d150 = Fillets"
equation "d156 = Fillets"
equation "d157 = Fillets"
equation "d158 = Fillets"
equation "d159 = Fillets"
equation "d160 = ( 1 / 4 ) * 1 in"
equation "d163 = 1/4\""
equation "d193 = 5/16\""
equation "d194 = 5/8\""
equation "d195 = 3/4\" + 1/32\""
equation "d196 = 7/8\""
equation "d197 = 1 1/32\""
equation "d198 = 1 3/16\""
equation "d199 = 3/4\" - 0.35 in"
equation "d202 = 5/16\""
equation "d203 = 15/32\""
equation "d204 = 7/16\""
equation "d206 = 1/8\""
equation "d210 = 3/8\""
equation "d212 = 0\""
equation "d213 = 0\""
equation "d214 = 0\""
equation "d216 = 0\""
equation "d217 = 0\""
equation "d218 = 0\""
equation "d220 = 1/2\""
equation "d221 = ( 5 / 8 ) * 1 in"
equation "d222 = ( 5 / 16 ) * 1 in"
equation "d224 = 5.50 in - 0.125 in"
